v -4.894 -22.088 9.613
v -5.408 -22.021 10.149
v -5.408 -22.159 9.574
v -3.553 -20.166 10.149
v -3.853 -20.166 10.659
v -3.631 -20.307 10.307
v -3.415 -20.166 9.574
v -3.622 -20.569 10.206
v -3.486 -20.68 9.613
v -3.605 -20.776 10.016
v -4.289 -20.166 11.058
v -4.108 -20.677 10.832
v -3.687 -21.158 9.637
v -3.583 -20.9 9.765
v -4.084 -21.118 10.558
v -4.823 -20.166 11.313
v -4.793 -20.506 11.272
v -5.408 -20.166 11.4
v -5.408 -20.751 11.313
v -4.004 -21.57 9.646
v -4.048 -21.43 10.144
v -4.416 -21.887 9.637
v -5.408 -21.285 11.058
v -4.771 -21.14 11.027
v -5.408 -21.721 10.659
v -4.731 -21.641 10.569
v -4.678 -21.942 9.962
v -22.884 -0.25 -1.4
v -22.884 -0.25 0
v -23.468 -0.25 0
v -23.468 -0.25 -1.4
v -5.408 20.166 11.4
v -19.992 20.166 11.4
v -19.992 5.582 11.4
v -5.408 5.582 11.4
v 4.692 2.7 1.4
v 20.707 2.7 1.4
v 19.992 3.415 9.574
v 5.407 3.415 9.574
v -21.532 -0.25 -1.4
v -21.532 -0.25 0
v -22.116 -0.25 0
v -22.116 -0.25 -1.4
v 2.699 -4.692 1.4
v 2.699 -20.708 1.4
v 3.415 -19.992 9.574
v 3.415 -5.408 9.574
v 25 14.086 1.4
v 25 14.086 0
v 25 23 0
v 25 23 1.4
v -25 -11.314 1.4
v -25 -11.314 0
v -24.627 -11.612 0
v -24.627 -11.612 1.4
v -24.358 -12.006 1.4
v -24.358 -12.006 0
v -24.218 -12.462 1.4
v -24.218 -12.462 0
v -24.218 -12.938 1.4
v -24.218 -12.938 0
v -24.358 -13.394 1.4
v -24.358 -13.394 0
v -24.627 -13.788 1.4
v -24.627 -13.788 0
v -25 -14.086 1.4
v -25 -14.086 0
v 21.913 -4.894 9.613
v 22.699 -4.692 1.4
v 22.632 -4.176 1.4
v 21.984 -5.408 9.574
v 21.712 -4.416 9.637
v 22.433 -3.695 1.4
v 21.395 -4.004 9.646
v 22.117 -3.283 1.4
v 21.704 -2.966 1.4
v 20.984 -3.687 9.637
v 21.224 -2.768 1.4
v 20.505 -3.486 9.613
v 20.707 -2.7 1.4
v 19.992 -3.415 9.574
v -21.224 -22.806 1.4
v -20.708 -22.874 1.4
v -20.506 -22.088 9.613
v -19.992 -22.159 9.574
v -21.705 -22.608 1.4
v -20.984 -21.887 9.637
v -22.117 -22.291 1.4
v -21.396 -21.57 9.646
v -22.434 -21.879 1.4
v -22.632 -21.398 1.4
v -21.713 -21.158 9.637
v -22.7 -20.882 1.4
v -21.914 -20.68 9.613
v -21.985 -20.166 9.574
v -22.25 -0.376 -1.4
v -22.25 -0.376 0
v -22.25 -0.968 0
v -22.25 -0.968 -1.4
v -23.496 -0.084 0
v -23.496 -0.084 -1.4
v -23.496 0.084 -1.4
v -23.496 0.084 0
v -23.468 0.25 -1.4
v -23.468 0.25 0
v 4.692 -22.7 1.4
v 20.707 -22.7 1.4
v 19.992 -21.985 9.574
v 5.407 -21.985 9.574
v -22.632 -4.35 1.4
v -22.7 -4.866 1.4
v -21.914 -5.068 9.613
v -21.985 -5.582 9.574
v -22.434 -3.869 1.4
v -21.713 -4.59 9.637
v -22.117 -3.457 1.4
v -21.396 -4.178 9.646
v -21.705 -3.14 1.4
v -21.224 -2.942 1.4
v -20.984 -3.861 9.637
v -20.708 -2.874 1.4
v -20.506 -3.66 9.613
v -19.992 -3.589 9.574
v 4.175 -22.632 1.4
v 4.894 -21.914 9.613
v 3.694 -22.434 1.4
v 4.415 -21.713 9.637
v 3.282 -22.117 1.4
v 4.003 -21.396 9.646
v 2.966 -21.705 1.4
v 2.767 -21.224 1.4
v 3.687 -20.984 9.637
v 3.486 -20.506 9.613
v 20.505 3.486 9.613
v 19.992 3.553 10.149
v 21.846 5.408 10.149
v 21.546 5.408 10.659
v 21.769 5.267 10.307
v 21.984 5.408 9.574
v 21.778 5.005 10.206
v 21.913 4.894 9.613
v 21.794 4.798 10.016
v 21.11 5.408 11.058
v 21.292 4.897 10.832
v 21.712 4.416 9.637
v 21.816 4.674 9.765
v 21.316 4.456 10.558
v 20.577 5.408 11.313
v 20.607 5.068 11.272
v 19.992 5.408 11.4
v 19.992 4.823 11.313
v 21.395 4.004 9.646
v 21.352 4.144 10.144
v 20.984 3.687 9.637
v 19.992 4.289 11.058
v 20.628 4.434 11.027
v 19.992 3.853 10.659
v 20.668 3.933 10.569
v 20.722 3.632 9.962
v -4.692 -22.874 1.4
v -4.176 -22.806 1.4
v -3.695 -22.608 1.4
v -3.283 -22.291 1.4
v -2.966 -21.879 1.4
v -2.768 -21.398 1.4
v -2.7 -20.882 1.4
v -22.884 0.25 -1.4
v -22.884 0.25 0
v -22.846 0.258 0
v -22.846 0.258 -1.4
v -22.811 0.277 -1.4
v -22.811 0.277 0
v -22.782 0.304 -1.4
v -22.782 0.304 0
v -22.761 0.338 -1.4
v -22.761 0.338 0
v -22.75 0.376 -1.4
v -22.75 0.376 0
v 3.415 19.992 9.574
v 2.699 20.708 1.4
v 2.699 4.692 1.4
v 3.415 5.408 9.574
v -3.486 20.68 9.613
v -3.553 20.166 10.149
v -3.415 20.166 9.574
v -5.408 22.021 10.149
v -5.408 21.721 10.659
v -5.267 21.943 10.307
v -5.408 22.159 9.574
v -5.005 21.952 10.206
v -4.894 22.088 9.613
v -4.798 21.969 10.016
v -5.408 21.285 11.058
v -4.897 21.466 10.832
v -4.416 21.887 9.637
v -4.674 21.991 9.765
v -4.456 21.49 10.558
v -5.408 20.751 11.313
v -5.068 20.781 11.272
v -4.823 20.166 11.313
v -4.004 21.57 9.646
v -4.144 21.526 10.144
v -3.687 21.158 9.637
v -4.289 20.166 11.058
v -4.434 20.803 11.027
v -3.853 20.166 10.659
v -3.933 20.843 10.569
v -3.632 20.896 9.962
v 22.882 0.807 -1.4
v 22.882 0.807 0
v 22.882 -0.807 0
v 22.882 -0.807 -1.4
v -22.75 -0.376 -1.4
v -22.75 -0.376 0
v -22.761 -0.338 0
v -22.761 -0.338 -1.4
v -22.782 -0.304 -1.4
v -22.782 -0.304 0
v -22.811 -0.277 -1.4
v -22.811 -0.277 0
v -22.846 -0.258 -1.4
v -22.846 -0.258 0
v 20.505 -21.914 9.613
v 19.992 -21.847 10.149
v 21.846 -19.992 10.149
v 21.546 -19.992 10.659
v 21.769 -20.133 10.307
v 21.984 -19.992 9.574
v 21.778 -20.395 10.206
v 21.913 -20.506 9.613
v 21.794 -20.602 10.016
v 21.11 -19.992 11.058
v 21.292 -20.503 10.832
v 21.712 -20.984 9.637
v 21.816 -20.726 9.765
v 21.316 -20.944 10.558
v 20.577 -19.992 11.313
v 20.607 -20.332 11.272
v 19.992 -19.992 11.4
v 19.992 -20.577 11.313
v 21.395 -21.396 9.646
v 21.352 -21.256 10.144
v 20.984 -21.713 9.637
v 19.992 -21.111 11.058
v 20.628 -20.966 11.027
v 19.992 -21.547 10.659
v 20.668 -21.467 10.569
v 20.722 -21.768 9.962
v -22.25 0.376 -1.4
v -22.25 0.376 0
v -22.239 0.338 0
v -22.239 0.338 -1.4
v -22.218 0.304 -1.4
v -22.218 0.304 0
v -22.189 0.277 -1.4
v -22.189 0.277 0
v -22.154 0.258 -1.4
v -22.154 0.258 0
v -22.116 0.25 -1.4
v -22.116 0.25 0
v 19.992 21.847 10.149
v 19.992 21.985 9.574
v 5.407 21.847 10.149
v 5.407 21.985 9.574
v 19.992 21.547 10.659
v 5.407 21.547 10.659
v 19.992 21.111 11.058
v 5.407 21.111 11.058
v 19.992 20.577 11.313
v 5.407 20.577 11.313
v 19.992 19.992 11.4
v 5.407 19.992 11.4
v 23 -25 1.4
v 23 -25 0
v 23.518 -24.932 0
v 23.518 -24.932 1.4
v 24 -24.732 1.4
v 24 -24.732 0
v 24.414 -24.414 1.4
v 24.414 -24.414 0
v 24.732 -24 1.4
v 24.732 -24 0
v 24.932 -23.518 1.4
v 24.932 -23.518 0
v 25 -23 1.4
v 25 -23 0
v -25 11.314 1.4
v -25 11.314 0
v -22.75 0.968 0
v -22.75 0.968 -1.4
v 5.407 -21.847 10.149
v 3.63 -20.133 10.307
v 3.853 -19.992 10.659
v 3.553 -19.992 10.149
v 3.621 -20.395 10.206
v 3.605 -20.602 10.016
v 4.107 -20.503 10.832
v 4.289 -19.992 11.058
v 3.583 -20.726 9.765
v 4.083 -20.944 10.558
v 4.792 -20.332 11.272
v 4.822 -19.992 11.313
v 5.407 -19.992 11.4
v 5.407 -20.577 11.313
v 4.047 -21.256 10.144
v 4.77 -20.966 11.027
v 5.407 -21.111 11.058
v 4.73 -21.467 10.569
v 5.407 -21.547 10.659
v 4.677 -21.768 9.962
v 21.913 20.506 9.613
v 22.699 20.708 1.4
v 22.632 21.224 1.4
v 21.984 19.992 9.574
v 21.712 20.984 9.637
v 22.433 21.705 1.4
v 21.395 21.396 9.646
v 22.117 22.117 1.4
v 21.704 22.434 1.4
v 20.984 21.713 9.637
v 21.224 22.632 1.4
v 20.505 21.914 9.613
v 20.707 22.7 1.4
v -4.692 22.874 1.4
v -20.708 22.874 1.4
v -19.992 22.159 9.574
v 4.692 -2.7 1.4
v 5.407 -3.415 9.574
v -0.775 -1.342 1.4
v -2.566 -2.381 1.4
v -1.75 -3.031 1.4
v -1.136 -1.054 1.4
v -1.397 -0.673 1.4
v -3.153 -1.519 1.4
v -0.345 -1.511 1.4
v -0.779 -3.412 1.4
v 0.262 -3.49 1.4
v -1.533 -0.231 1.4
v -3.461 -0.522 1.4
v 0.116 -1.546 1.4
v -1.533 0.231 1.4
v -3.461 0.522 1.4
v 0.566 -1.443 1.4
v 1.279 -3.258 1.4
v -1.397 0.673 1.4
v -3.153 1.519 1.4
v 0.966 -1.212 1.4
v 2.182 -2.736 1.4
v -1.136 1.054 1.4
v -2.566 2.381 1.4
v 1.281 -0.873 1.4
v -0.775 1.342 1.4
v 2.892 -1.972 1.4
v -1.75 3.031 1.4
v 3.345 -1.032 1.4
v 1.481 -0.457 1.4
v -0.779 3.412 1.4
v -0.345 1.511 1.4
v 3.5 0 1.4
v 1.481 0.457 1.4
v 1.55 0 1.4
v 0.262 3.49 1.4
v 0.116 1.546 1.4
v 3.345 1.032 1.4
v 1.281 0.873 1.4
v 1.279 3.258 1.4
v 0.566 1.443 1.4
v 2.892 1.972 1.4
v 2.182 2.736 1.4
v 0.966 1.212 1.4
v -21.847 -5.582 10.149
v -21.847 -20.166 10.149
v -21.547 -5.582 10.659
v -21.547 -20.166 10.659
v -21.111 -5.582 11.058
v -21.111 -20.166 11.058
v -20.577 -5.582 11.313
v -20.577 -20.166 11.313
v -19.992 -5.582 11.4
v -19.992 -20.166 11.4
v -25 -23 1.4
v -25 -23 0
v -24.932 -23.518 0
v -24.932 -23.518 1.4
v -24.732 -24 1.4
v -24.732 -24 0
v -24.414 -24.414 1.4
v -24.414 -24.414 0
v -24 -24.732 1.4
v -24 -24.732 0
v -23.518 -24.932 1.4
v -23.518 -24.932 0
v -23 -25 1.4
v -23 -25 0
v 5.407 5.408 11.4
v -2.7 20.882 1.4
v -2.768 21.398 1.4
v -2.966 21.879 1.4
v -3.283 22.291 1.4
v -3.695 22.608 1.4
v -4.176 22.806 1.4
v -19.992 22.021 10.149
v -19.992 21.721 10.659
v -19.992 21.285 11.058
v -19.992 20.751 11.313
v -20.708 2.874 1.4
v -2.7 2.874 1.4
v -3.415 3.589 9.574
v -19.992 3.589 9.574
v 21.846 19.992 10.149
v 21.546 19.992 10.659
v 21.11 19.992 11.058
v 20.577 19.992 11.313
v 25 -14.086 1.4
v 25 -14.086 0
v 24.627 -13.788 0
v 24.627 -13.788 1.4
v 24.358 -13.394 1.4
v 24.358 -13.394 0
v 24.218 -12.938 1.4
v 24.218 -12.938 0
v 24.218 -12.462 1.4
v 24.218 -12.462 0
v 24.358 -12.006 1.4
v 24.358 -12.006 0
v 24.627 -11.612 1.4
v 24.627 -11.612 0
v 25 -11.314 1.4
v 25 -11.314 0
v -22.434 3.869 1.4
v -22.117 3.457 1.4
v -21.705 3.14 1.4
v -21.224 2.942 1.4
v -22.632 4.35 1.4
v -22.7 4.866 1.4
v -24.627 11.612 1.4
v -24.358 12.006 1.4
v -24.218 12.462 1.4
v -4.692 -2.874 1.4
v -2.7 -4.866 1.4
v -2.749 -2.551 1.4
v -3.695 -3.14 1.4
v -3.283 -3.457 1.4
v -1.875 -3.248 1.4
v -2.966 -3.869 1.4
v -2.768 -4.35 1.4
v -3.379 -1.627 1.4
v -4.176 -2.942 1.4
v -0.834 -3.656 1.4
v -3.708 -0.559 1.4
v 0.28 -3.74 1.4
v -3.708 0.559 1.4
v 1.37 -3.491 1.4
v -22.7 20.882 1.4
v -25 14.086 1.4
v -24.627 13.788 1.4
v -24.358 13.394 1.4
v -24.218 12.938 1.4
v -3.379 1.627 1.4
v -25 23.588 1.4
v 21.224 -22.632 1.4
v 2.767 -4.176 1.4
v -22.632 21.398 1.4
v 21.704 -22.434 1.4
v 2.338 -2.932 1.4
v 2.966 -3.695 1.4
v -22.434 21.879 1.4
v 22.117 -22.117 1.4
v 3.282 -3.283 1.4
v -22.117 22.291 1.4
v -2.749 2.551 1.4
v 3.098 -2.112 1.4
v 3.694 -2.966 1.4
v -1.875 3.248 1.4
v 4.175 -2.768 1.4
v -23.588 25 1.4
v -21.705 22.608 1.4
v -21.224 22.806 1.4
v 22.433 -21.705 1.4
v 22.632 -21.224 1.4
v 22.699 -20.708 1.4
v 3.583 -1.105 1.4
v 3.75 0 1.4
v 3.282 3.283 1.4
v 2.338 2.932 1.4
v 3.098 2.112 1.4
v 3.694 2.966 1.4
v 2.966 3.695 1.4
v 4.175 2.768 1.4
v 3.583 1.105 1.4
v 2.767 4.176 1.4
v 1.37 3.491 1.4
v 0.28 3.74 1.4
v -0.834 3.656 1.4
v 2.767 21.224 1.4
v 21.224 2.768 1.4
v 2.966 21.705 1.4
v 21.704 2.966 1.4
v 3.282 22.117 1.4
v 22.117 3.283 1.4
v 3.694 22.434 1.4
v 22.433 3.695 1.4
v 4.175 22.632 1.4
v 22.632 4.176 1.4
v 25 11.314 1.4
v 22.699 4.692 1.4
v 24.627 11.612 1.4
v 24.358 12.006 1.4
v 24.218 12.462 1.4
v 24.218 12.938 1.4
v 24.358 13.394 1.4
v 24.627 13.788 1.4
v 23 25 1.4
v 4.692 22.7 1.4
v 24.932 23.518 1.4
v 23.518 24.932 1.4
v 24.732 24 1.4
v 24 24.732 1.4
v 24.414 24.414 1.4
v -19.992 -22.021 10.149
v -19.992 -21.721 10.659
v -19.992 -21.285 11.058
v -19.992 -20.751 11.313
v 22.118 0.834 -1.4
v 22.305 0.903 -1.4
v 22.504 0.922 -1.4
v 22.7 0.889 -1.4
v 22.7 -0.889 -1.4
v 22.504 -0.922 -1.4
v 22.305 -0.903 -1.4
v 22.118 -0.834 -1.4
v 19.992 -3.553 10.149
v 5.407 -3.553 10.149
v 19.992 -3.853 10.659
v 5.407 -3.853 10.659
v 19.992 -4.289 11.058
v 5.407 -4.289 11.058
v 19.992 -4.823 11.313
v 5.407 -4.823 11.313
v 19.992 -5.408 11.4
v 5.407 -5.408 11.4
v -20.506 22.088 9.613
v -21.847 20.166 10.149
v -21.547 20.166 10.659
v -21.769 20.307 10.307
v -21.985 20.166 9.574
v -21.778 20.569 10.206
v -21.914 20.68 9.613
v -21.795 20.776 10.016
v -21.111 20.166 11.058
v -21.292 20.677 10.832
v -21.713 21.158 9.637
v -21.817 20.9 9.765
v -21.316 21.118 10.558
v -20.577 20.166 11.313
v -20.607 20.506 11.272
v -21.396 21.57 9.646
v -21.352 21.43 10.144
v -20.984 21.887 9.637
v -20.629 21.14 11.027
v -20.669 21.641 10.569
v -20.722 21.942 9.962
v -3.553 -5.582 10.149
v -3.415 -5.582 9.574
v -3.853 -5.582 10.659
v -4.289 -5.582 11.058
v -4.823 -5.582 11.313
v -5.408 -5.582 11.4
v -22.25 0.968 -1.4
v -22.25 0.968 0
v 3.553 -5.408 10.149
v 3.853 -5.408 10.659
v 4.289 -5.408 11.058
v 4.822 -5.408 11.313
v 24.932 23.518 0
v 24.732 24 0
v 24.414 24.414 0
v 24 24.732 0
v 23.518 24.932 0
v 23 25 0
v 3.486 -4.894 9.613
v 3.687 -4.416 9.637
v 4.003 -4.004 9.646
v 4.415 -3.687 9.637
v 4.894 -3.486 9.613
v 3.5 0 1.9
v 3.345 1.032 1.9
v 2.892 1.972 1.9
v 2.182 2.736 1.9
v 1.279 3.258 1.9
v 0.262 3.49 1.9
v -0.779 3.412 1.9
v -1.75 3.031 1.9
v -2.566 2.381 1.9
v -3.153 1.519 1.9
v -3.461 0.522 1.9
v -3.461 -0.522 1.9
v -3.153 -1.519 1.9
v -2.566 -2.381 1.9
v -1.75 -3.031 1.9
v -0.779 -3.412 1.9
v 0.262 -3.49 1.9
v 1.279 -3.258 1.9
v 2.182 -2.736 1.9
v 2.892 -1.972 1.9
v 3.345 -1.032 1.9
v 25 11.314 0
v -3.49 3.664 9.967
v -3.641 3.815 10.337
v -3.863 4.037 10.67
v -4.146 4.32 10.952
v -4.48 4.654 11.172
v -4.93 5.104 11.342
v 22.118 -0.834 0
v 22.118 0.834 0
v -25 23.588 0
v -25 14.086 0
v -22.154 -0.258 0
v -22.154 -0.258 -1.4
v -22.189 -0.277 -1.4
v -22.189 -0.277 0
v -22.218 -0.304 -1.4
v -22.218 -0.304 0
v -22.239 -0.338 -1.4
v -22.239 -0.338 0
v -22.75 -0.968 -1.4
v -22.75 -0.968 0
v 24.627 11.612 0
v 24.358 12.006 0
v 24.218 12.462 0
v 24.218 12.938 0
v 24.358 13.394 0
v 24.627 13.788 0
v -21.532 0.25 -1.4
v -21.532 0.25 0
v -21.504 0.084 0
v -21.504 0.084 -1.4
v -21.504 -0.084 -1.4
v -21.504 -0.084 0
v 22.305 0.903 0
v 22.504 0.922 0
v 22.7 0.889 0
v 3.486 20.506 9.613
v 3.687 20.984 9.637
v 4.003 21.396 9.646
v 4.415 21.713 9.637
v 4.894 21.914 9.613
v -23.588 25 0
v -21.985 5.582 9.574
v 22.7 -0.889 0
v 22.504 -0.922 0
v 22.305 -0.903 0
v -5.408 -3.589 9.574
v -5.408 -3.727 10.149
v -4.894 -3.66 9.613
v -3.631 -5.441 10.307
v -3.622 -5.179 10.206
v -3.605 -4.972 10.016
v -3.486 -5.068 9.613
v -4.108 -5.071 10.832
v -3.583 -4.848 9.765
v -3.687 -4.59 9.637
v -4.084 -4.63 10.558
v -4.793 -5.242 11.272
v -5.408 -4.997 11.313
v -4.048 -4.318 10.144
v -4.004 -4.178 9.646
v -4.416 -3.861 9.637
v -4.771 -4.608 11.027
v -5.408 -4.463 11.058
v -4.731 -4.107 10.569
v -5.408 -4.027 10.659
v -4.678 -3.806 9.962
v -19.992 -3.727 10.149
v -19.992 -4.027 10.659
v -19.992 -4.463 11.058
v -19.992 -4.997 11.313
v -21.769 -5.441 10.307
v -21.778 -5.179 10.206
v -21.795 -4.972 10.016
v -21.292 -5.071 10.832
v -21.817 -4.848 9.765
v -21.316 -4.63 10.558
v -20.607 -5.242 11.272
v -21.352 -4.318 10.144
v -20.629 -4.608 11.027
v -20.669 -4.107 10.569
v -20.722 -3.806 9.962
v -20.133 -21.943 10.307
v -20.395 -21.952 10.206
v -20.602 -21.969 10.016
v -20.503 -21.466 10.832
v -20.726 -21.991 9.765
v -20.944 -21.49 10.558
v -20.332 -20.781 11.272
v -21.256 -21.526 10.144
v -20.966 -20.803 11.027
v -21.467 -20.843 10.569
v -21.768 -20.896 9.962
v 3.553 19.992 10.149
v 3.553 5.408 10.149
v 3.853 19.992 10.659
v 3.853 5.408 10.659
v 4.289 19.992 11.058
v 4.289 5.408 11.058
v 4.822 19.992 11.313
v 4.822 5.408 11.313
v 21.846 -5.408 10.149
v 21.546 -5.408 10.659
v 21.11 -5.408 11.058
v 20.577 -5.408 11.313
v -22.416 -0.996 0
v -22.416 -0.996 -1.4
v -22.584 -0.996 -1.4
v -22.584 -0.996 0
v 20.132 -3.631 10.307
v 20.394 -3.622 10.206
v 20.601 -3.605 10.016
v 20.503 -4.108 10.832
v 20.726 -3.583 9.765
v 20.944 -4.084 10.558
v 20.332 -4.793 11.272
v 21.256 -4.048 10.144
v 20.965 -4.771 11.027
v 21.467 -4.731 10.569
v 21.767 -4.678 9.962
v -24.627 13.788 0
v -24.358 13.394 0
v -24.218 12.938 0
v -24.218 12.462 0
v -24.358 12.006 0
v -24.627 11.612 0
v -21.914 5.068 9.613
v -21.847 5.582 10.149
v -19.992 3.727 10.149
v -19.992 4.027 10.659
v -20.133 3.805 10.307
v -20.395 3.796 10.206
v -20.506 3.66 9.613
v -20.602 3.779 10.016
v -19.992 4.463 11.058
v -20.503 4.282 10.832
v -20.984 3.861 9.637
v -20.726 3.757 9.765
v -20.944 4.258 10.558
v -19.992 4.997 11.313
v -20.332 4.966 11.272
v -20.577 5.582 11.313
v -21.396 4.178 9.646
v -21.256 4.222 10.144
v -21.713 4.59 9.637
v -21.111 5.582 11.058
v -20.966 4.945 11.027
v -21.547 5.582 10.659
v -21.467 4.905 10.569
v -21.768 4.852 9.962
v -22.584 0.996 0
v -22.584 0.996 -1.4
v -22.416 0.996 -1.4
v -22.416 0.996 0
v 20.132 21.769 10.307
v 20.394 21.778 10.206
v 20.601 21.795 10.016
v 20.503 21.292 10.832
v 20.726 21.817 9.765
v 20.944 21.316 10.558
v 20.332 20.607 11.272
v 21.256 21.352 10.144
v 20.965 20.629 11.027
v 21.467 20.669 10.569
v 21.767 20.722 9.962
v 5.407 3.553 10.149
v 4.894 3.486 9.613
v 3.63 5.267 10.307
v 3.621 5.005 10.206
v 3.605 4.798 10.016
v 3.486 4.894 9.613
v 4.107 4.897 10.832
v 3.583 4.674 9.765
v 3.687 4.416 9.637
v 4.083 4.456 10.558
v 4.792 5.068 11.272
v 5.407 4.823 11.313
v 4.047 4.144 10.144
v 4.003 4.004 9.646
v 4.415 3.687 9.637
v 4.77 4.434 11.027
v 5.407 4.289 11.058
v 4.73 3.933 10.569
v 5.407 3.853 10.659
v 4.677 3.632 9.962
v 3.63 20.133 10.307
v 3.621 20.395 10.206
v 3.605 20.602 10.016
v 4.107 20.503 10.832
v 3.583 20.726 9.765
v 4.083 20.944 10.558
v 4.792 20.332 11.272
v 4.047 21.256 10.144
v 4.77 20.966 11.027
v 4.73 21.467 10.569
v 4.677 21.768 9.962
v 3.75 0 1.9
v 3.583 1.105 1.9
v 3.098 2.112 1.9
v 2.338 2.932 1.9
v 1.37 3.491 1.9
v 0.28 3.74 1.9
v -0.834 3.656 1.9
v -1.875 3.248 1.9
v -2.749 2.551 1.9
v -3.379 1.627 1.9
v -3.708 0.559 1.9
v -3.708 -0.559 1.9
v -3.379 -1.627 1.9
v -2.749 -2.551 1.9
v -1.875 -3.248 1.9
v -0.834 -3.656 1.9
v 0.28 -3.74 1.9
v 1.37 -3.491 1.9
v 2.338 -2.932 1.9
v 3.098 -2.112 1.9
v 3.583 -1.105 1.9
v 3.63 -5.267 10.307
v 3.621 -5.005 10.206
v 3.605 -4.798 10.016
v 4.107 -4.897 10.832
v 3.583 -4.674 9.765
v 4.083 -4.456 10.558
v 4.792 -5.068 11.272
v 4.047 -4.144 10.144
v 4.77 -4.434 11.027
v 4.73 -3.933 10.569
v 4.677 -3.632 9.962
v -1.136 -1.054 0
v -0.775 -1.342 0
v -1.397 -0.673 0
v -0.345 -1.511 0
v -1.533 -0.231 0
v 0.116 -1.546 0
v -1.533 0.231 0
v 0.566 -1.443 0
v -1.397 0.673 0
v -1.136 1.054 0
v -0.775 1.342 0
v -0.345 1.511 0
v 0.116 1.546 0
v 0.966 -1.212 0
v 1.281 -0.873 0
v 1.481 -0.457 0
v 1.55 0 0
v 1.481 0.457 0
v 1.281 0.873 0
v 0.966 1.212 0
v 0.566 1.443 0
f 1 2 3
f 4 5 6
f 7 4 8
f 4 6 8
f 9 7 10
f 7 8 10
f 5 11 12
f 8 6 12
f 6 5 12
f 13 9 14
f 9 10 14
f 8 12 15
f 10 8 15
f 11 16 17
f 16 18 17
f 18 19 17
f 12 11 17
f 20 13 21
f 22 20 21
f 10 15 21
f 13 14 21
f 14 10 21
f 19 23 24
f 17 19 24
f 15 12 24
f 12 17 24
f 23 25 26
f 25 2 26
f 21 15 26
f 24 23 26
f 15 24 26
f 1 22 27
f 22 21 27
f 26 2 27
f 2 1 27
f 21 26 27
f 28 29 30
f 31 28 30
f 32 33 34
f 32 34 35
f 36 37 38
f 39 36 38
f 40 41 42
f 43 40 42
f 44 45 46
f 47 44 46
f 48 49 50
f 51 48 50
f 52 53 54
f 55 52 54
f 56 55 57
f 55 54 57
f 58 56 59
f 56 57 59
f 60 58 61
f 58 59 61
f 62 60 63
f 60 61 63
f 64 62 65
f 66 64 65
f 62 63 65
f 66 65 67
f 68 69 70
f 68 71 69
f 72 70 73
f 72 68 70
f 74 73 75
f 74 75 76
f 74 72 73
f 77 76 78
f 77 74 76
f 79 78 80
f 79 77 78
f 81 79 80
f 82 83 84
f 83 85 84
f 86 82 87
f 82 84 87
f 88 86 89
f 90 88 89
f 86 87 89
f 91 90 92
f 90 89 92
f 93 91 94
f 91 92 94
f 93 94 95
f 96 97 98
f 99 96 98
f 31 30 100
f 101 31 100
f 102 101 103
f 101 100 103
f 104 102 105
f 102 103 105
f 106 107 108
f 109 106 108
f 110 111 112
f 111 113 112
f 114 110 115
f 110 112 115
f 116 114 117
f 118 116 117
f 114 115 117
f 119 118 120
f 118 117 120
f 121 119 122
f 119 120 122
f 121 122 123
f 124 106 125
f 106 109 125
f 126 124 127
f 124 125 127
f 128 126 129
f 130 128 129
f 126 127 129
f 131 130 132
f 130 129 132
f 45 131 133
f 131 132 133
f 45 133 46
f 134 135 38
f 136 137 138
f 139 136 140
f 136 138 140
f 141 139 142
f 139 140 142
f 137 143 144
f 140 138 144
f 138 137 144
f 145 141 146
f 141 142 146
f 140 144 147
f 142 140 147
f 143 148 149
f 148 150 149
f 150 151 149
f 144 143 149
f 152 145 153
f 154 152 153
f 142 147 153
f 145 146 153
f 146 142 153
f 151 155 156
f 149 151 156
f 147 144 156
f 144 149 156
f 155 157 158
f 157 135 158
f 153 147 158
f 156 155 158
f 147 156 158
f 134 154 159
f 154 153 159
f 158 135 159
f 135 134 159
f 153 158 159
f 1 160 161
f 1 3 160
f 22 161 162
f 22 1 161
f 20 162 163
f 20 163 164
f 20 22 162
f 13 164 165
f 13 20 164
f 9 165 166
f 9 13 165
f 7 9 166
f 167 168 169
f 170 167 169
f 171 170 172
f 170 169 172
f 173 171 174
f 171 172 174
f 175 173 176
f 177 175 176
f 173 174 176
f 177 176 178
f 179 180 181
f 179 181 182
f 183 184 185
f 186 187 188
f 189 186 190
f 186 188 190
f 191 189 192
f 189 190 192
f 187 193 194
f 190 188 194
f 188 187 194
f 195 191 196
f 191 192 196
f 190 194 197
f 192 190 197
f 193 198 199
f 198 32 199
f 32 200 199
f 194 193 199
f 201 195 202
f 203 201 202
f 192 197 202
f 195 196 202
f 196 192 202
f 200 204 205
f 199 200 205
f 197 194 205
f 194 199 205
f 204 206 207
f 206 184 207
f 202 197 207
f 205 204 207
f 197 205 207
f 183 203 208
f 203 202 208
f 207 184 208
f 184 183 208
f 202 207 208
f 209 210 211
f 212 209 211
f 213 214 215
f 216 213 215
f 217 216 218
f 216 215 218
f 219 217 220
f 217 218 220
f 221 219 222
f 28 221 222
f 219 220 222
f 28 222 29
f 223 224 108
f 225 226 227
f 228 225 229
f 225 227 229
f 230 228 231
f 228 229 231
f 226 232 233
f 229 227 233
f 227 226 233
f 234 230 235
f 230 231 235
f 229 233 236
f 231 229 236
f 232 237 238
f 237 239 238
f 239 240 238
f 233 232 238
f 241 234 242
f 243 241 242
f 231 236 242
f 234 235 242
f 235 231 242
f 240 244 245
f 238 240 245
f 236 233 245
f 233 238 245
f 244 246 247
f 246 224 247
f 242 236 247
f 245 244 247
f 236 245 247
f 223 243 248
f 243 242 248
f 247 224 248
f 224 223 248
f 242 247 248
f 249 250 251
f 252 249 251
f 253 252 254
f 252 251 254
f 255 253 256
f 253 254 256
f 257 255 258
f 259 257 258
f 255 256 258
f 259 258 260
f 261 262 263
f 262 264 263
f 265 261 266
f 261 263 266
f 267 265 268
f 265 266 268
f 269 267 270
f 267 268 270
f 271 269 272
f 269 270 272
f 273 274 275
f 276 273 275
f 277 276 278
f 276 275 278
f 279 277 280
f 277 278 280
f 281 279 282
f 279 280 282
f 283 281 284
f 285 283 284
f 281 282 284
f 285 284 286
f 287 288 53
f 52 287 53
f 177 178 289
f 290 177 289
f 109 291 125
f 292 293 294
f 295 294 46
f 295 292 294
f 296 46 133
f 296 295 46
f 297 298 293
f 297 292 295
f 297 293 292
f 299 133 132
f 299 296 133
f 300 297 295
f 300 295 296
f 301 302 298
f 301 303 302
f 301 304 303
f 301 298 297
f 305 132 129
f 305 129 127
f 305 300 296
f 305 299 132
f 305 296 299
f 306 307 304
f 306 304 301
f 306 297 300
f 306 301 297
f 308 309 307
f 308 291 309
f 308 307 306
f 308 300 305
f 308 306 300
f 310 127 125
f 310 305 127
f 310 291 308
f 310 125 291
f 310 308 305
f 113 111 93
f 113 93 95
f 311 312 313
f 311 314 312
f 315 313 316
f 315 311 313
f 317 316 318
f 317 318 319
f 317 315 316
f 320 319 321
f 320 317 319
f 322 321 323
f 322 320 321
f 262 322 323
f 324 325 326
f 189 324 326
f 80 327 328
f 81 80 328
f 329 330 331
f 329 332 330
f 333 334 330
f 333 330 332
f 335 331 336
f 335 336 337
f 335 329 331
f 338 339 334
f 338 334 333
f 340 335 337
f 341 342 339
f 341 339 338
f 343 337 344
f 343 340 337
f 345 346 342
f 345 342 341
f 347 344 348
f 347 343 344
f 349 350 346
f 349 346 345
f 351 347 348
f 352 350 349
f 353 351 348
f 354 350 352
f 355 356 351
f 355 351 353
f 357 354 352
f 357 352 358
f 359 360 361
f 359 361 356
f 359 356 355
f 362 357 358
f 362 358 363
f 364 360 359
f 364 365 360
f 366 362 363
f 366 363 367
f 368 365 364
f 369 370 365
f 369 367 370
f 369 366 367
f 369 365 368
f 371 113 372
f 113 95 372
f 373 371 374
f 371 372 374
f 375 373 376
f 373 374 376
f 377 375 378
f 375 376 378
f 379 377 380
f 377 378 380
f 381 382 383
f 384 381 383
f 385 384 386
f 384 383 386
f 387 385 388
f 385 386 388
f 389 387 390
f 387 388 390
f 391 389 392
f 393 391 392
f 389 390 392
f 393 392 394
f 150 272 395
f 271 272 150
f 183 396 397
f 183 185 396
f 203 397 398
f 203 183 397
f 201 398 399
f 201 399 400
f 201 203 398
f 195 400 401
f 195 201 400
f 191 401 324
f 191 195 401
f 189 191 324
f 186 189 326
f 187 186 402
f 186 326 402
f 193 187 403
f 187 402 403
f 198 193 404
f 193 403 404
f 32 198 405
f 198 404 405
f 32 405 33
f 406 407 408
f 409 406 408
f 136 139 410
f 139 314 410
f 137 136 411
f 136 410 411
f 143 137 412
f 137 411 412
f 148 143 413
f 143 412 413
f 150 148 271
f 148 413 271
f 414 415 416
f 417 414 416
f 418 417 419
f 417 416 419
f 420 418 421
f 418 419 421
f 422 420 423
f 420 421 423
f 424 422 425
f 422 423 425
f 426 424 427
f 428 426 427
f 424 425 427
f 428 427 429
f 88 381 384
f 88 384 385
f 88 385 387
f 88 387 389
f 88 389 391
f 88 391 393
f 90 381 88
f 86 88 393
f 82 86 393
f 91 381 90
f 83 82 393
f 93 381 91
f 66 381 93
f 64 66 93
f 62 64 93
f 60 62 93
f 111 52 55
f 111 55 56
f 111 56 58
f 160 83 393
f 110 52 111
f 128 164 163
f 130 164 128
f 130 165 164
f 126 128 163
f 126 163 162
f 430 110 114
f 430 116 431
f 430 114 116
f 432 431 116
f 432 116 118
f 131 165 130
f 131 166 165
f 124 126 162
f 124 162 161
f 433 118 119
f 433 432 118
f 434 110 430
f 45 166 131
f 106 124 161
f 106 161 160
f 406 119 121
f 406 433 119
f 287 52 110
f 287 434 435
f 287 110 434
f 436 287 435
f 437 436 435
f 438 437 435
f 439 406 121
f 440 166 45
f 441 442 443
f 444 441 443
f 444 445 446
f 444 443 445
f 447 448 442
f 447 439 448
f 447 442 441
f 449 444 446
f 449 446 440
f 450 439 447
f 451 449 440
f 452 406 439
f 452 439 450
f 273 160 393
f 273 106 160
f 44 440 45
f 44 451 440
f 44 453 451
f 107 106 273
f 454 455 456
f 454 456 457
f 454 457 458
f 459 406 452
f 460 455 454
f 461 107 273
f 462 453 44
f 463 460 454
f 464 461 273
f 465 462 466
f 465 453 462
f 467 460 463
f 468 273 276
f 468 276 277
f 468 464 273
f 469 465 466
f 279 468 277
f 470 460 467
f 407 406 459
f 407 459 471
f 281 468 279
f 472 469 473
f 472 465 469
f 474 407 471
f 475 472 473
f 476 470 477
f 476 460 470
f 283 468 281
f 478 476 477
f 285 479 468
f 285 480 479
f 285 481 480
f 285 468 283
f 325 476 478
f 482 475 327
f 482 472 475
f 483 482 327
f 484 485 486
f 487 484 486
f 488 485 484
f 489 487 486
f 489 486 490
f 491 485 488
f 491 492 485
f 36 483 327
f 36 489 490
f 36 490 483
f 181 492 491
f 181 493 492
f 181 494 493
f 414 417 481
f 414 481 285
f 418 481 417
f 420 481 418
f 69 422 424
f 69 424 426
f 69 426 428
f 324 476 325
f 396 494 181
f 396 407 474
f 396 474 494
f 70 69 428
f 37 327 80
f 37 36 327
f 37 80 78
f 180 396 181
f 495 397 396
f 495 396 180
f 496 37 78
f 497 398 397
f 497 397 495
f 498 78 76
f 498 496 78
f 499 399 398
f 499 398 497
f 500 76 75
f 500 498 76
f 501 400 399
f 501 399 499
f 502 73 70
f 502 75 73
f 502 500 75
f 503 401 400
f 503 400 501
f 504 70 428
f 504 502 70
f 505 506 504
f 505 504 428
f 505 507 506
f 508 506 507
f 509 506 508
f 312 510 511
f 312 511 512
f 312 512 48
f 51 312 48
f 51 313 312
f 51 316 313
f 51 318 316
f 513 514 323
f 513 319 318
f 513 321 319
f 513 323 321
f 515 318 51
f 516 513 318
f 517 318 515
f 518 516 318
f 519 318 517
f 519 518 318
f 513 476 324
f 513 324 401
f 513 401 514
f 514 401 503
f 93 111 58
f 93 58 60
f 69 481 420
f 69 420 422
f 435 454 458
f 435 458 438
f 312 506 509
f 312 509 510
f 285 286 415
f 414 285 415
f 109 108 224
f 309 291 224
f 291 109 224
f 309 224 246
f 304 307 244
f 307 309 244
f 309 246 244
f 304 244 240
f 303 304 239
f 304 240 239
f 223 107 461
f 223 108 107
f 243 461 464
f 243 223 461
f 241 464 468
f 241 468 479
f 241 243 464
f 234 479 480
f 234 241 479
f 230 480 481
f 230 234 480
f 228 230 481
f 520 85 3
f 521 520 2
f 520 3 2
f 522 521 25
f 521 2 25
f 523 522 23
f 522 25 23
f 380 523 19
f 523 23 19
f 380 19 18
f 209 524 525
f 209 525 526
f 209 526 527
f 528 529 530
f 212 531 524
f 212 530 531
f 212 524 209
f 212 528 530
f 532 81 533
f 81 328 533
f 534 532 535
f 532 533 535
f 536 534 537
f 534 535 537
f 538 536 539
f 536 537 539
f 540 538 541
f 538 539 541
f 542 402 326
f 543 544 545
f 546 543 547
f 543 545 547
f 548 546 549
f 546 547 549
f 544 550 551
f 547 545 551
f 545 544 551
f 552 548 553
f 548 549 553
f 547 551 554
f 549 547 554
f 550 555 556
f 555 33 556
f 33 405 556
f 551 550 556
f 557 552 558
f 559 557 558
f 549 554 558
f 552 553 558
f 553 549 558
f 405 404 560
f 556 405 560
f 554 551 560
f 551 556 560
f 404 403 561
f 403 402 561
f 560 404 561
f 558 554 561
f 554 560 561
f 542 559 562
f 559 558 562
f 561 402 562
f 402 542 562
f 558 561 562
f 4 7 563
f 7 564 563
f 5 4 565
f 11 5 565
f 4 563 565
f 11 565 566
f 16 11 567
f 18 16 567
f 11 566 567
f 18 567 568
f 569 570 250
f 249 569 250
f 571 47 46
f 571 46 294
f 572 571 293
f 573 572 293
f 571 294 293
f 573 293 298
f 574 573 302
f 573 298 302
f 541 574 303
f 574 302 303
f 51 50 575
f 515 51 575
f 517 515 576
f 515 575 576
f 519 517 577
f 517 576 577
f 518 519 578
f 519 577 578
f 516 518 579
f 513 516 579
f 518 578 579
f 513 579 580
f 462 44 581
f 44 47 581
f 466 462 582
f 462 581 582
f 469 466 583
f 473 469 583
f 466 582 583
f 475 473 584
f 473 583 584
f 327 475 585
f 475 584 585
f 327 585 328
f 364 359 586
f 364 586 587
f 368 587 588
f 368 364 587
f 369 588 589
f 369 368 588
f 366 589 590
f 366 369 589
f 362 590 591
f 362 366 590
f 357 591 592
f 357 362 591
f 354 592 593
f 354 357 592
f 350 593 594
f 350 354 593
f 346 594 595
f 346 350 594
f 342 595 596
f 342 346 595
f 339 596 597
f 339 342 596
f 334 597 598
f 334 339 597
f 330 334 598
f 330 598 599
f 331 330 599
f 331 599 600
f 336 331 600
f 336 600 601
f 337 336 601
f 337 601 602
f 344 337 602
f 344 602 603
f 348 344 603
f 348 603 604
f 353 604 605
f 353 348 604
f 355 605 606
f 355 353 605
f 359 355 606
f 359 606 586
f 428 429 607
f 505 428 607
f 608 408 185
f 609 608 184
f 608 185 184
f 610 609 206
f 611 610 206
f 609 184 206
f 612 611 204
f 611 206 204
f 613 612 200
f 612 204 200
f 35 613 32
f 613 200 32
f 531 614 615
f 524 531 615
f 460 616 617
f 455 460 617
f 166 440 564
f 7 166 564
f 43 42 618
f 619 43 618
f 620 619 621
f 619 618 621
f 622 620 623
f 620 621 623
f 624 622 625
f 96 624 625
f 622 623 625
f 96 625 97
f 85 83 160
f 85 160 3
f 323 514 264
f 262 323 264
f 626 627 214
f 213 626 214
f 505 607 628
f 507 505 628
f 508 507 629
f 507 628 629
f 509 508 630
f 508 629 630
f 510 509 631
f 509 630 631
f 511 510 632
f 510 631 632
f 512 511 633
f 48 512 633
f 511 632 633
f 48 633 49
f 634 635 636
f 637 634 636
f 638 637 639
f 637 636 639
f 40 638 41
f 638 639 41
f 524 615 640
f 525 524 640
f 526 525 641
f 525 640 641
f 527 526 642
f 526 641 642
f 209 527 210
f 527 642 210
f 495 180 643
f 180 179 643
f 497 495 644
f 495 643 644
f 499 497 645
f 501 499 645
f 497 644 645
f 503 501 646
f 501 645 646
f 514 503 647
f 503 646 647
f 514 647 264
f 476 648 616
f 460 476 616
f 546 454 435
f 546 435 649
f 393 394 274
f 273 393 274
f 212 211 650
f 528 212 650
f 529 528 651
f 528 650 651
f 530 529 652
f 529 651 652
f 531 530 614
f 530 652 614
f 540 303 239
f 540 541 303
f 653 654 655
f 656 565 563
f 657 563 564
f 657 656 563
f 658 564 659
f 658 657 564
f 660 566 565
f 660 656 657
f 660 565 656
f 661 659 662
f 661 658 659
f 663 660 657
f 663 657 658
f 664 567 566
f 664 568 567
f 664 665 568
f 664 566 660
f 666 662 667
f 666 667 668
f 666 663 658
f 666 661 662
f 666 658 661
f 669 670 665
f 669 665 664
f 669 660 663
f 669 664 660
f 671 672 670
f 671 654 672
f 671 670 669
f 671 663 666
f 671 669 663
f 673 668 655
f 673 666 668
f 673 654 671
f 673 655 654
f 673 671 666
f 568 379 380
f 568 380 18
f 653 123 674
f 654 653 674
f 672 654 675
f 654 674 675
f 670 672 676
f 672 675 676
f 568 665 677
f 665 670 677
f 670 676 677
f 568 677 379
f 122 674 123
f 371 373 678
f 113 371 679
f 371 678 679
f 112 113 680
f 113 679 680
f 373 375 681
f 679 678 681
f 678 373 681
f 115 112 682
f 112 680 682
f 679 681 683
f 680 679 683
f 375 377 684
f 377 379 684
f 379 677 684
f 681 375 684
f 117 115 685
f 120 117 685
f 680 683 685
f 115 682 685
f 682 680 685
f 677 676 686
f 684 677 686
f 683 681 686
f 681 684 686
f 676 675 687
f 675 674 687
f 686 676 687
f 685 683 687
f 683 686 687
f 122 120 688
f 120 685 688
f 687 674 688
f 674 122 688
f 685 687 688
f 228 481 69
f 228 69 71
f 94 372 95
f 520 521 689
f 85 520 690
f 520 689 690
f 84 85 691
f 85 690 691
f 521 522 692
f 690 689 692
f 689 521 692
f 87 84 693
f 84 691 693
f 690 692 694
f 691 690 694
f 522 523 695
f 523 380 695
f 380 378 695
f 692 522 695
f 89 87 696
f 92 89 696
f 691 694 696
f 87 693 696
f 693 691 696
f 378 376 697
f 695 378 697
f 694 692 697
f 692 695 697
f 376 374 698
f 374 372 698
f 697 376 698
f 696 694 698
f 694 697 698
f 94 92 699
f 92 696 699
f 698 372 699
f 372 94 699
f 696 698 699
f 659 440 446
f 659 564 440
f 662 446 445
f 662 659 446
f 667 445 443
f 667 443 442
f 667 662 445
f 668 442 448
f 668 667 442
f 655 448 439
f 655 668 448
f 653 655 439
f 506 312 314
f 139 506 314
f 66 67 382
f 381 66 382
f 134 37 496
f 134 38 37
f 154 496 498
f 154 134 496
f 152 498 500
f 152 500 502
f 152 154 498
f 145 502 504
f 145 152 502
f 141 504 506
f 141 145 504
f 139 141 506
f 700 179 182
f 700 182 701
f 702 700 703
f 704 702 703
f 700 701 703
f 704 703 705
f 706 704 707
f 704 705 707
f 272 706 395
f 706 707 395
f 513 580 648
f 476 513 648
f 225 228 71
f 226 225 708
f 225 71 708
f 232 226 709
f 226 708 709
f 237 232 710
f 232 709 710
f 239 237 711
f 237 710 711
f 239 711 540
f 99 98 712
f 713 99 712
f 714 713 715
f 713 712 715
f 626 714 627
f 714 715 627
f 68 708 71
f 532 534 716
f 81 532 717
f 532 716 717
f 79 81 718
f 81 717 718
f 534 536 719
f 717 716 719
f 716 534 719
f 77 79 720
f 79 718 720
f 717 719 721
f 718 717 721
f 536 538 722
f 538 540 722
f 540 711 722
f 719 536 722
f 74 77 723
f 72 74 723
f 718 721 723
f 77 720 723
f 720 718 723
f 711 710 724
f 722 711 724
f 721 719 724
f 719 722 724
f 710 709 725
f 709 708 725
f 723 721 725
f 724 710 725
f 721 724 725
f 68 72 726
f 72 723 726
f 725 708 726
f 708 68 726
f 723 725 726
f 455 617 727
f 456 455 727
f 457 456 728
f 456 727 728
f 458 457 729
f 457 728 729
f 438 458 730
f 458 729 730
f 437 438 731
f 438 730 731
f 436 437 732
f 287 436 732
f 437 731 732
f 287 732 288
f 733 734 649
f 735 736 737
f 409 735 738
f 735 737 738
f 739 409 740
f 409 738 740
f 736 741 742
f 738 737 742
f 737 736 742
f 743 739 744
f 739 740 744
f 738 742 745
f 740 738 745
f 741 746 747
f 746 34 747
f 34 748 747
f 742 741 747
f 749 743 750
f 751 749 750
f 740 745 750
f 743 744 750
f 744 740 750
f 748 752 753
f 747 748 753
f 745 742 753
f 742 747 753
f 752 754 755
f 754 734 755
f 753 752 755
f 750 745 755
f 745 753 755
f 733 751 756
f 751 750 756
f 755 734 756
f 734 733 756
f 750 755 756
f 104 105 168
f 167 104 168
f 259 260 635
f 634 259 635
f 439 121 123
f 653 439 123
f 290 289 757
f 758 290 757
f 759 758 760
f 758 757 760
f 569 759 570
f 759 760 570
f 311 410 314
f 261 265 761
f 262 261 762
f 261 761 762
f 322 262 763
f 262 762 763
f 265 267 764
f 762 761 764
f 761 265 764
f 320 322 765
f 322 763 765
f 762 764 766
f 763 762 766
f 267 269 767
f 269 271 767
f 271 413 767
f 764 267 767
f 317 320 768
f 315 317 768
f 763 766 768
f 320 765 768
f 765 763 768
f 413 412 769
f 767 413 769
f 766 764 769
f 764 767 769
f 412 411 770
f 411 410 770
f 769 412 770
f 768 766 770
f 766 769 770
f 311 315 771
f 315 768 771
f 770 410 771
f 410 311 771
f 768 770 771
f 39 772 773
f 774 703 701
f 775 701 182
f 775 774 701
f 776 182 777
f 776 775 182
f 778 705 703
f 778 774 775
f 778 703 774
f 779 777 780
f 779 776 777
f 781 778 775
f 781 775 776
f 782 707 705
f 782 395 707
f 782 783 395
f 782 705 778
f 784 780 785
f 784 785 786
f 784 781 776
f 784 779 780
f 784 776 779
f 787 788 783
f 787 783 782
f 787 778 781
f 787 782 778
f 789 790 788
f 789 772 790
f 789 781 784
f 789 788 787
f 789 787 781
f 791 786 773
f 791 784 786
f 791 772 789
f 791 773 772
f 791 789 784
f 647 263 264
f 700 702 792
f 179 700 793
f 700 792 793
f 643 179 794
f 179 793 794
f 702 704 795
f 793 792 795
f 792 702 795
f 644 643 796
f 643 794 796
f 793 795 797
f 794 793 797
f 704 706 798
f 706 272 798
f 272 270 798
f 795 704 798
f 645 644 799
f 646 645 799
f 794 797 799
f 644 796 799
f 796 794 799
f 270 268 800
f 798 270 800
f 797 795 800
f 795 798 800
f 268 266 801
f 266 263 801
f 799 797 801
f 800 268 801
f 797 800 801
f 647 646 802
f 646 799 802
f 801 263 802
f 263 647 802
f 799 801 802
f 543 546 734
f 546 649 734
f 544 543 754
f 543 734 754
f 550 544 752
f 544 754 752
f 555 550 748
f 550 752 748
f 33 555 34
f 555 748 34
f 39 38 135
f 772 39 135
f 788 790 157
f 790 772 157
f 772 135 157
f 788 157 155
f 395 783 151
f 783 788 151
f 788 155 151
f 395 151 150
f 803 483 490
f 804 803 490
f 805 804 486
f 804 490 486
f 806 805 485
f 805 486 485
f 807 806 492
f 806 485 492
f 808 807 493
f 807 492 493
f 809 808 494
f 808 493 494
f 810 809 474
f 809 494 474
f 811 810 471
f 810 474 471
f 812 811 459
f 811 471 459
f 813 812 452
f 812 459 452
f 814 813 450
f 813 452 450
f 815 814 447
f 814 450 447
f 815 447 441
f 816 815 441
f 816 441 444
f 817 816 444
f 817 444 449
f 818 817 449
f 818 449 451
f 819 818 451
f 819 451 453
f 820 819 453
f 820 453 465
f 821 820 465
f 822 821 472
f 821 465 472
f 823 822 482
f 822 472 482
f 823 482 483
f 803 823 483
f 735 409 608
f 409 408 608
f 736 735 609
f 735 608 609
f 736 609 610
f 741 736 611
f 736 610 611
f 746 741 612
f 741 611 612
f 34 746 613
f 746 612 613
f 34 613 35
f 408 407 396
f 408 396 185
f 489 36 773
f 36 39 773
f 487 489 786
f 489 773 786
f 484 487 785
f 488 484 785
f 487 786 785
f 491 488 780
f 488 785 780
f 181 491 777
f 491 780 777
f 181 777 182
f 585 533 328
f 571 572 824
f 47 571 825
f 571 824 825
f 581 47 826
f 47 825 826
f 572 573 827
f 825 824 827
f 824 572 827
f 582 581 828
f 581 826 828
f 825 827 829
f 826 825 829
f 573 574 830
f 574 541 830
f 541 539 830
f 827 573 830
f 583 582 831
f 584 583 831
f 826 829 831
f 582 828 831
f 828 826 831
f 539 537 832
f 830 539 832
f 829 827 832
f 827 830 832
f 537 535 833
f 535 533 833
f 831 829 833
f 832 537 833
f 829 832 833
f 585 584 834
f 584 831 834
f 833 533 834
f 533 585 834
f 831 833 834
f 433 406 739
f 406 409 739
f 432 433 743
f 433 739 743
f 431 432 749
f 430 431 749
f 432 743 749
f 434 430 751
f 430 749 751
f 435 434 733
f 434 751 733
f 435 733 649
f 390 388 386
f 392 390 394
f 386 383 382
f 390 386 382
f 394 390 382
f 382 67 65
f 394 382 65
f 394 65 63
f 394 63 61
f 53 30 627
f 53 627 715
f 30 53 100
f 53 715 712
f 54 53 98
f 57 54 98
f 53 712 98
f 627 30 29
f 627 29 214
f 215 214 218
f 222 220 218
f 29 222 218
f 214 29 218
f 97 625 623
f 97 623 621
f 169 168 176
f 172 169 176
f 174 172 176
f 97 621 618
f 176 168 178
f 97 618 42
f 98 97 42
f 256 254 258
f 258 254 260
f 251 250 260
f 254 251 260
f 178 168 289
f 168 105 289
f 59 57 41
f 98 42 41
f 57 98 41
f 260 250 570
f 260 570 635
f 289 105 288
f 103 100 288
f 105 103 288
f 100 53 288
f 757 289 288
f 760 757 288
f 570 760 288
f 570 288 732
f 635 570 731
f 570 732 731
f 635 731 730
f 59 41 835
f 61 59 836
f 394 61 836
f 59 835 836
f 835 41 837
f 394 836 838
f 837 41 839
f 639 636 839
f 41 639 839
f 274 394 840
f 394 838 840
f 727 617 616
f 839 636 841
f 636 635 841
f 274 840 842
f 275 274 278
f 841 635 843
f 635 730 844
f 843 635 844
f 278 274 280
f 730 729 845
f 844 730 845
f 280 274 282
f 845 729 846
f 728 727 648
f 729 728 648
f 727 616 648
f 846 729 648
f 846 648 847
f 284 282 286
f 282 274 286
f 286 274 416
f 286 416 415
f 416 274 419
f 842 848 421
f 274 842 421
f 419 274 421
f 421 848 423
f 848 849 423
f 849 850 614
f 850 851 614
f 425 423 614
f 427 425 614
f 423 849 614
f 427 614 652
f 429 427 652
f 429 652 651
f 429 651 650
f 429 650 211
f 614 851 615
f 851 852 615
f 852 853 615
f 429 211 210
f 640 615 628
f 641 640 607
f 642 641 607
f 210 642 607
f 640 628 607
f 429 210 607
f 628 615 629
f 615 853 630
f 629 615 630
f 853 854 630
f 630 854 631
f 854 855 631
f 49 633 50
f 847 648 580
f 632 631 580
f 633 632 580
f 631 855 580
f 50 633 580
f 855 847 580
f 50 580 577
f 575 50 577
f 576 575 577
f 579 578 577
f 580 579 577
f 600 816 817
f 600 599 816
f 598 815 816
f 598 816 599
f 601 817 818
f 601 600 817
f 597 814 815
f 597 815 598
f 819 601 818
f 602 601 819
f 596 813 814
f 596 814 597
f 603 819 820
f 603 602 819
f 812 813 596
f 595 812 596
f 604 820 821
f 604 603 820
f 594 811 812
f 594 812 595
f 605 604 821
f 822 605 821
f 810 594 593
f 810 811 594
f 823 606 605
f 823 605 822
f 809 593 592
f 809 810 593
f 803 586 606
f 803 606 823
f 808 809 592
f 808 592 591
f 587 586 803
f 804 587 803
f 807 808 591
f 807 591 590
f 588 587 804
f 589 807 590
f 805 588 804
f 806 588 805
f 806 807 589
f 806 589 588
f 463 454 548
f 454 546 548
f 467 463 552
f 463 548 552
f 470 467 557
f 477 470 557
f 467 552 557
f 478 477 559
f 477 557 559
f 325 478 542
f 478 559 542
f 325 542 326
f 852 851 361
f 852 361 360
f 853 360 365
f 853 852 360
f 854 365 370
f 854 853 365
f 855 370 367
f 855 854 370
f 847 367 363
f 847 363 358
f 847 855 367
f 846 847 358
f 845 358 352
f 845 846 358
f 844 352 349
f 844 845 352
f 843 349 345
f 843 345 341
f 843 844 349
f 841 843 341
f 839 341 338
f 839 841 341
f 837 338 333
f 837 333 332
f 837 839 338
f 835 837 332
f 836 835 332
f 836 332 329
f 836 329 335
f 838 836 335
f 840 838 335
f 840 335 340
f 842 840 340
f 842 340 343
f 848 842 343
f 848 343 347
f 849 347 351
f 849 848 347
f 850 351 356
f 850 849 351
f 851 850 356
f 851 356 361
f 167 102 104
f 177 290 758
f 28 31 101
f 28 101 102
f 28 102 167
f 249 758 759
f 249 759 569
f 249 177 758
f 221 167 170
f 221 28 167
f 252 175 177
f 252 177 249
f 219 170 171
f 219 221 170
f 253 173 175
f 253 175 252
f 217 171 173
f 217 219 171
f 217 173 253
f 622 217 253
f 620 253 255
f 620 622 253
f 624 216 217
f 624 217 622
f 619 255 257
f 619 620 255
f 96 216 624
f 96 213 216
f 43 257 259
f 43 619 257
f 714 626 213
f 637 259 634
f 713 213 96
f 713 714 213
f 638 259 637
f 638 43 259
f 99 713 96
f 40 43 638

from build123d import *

# Parameters (mm, degrees)
F0_R     = 1.55
F1_DEPTH = 1.4
F2_W     = 20
F2_H     = 20
F3_DEPTH = 10
F3_TAPER = 5
F4_R     = 3.75
F4_R_2   = 3.5
F5_DEPTH = 0.5
F7_DEPTH = 1.4
F8_R     = 2


with BuildPart() as f1:
    # F0 (on Top) → F1 (new body)
    with BuildSketch(Plane.XY):
        with BuildLine():
            Line((23, 25), (-23.5878064872, 25))
            Line((-23.5878064872, 25), (-25, 23.5878064872))
            Line((-25, 23.5878064872), (-25, 14.0856406461))
            ThreePointArc((-25, 14.0856406461), (-24.2, 12.7), (-25, 11.3143593539))
            Line((-25, 11.3143593539), (-25, -11.3143593539))
            ThreePointArc((-25, -11.3143593539), (-24.2, -12.7), (-25, -14.0856406461))
            Line((-25, -14.0856406461), (-25, -23))
            ThreePointArc((-25, -23), (-24.4142135624, -24.4142135624), (-23, -25))
            Line((-23, -25), (23, -25))
            ThreePointArc((23, -25), (24.4142135624, -24.4142135624), (25, -23))
            Line((25, -23), (25, -14.0856406461))
            ThreePointArc((25, -14.0856406461), (24.2, -12.7), (25, -11.3143593539))
            Line((25, -11.3143593539), (25, 11.3143593539))
            ThreePointArc((25, 11.3143593539), (24.2, 12.7), (25, 14.0856406461))
            Line((25, 14.0856406461), (25, 23))
            ThreePointArc((25, 23), (24.4142135624, 24.4142135624), (23, 25))
        make_face()
        Circle(F0_R, mode=Mode.SUBTRACT)
    extrude(amount=F1_DEPTH)

    # F2 (on face) → F3 (join)
    with BuildSketch(Plane.XY.offset(1.4)):
        with Locations((-12.7, 12.8739687322)):
            Rectangle(F2_W, F2_H)
        with Locations((12.6994042229, 12.7)):
            Rectangle(F2_W, F2_H)
        with Locations((12.6994042229, -12.7)):
            Rectangle(F2_W, F2_H)
        with Locations((-12.7, -12.8739687322)):
            Rectangle(F2_W, F2_H)
    extrude(amount=F3_DEPTH, taper=F3_TAPER)

    # F4 (on face) → F5 (join)
    with BuildSketch(Plane.XY.offset(1.4)):
        Circle(F4_R)
        Circle(F4_R_2, mode=Mode.SUBTRACT)
    extrude(amount=F5_DEPTH)

    # F6 (on face) → F7 (join)
    with BuildSketch(Plane(origin=(0, 0, 0), x_dir=(1, 0, 0), z_dir=(0, 0, -1))):
        with BuildLine():
            Line((-22.8843539953, 0.25), (-23.4682458366, 0.25))
            ThreePointArc((-23.4682458366, 0.25), (-23.5, 0), (-23.4682458366, -0.25))
            Line((-23.4682458366, -0.25), (-22.8843539953, -0.25))
            ThreePointArc((-22.8843539953, -0.25), (-22.7951967548, -0.2895183078), (-22.75, -0.3759356876))
            ThreePointArc((-22.75, -0.3759356876), (-22.7484251347, -0.397465641), (-22.75, -0.4189955944))
            Line((-22.75, -0.4189955944), (-22.75, -0.9682458366))
            ThreePointArc((-22.75, -0.9682458366), (-22.5, -1), (-22.25, -0.9682458366))
            Line((-22.25, -0.9682458366), (-22.25, -0.4189955944))
            ThreePointArc((-22.25, -0.4189955944), (-22.2515748653, -0.397465641), (-22.25, -0.3759356876))
            ThreePointArc((-22.25, -0.3759356876), (-22.2048032452, -0.2895183078), (-22.1156460047, -0.25))
            Line((-22.1156460047, -0.25), (-21.5317541634, -0.25))
            ThreePointArc((-21.5317541634, -0.25), (-21.5, 0), (-21.5317541634, 0.25))
            Line((-21.5317541634, 0.25), (-22.1156460047, 0.25))
            ThreePointArc((-22.1156460047, 0.25), (-22.2048032452, 0.2895183078), (-22.25, 0.3759356876))
            ThreePointArc((-22.25, 0.3759356876), (-22.2515748653, 0.397465641), (-22.25, 0.4189955944))
            Line((-22.25, 0.4189955944), (-22.25, 0.9682458366))
            ThreePointArc((-22.25, 0.9682458366), (-22.5, 1), (-22.75, 0.9682458366))
            Line((-22.75, 0.9682458366), (-22.75, 0.4189955944))
            ThreePointArc((-22.75, 0.4189955944), (-22.7484251347, 0.397465641), (-22.75, 0.3759356876))
            ThreePointArc((-22.75, 0.3759356876), (-22.7951967548, 0.2895183078), (-22.8843539953, 0.25))
        make_face()
        with BuildLine():
            Line((-22.75, 0.4189955944), (-22.75, 0.3759356876))
            ThreePointArc((-22.75, 0.3759356876), (-22.7484251347, 0.397465641), (-22.75, 0.4189955944))
        make_face()
        with BuildLine():
            ThreePointArc((-22.75, -0.4189955944), (-22.7484251347, -0.397465641), (-22.75, -0.3759356876))
            Line((-22.75, -0.3759356876), (-22.75, -0.4189955944))
        make_face()
        with BuildLine():
            Line((-22.25, 0.3759356876), (-22.25, 0.4189955944))
            ThreePointArc((-22.25, 0.4189955944), (-22.2515748653, 0.397465641), (-22.25, 0.3759356876))
        make_face()
        with BuildLine():
            ThreePointArc((-22.25, -0.3759356876), (-22.2515748653, -0.397465641), (-22.25, -0.4189955944))
            Line((-22.25, -0.4189955944), (-22.25, -0.3759356876))
        make_face()
        with BuildLine():
            Line((22.1181050964, 0.8344019427), (22.1181050964, -0.8344019427))
            ThreePointArc((22.1181050964, -0.8344019427), (22.5036541776, -0.9220035064), (22.8818949036, -0.8068684502))
            Line((22.8818949036, -0.8068684502), (22.8818949036, 0.8068684502))
            ThreePointArc((22.8818949036, 0.8068684502), (22.5036541776, 0.9220035064), (22.1181050964, 0.8344019427))
        make_face()
    extrude(amount=F7_DEPTH)

    # F8
    f8_edges = [f1.edges().sort_by_distance(p)[0] for p in [
        (-3.574887, 12.873969, 11.4),
        (-12.7, 21.999082, 11.4),
        (-21.825113, 12.873969, 11.4),
        (-12.7, 3.748855, 11.4),
        (12.699404, 3.574887, 11.4),
        (21.824518, 12.7, 11.4),
        (12.699404, 21.825113, 11.4),
        (3.574291, 12.7, 11.4),
        (12.699404, -21.825113, 11.4),
        (21.824518, -12.7, 11.4),
        (12.699404, -3.574887, 11.4),
        (3.574291, -12.7, 11.4),
        (-12.7, -3.748855, 11.4),
        (-21.825113, -12.873969, 11.4),
        (-12.7, -21.999082, 11.4),
        (-3.574887, -12.873969, 11.4),
        (-22.262557, 3.311412, 6.4),
        (-22.262557, -3.311412, 6.4),
        (-22.262557, -22.436525, 6.4),
        (-3.137443, -22.436525, 6.4),
        (3.136848, -22.262557, 6.4),
        (22.261961, -22.262557, 6.4),
        (3.136848, 3.137443, 6.4),
        (22.261961, 3.137443, 6.4),
        (22.261961, 22.262557, 6.4),
        (3.136848, 22.262557, 6.4),
        (-3.137443, 22.436525, 6.4),
        (-22.262557, 22.436525, 6.4),
        (22.261961, -3.137443, 6.4),
        (3.136848, -3.137443, 6.4),
        (-3.137443, -3.311412, 6.4),
    ]]
    fillet(f8_edges, radius=F8_R)


solid = f1.part
